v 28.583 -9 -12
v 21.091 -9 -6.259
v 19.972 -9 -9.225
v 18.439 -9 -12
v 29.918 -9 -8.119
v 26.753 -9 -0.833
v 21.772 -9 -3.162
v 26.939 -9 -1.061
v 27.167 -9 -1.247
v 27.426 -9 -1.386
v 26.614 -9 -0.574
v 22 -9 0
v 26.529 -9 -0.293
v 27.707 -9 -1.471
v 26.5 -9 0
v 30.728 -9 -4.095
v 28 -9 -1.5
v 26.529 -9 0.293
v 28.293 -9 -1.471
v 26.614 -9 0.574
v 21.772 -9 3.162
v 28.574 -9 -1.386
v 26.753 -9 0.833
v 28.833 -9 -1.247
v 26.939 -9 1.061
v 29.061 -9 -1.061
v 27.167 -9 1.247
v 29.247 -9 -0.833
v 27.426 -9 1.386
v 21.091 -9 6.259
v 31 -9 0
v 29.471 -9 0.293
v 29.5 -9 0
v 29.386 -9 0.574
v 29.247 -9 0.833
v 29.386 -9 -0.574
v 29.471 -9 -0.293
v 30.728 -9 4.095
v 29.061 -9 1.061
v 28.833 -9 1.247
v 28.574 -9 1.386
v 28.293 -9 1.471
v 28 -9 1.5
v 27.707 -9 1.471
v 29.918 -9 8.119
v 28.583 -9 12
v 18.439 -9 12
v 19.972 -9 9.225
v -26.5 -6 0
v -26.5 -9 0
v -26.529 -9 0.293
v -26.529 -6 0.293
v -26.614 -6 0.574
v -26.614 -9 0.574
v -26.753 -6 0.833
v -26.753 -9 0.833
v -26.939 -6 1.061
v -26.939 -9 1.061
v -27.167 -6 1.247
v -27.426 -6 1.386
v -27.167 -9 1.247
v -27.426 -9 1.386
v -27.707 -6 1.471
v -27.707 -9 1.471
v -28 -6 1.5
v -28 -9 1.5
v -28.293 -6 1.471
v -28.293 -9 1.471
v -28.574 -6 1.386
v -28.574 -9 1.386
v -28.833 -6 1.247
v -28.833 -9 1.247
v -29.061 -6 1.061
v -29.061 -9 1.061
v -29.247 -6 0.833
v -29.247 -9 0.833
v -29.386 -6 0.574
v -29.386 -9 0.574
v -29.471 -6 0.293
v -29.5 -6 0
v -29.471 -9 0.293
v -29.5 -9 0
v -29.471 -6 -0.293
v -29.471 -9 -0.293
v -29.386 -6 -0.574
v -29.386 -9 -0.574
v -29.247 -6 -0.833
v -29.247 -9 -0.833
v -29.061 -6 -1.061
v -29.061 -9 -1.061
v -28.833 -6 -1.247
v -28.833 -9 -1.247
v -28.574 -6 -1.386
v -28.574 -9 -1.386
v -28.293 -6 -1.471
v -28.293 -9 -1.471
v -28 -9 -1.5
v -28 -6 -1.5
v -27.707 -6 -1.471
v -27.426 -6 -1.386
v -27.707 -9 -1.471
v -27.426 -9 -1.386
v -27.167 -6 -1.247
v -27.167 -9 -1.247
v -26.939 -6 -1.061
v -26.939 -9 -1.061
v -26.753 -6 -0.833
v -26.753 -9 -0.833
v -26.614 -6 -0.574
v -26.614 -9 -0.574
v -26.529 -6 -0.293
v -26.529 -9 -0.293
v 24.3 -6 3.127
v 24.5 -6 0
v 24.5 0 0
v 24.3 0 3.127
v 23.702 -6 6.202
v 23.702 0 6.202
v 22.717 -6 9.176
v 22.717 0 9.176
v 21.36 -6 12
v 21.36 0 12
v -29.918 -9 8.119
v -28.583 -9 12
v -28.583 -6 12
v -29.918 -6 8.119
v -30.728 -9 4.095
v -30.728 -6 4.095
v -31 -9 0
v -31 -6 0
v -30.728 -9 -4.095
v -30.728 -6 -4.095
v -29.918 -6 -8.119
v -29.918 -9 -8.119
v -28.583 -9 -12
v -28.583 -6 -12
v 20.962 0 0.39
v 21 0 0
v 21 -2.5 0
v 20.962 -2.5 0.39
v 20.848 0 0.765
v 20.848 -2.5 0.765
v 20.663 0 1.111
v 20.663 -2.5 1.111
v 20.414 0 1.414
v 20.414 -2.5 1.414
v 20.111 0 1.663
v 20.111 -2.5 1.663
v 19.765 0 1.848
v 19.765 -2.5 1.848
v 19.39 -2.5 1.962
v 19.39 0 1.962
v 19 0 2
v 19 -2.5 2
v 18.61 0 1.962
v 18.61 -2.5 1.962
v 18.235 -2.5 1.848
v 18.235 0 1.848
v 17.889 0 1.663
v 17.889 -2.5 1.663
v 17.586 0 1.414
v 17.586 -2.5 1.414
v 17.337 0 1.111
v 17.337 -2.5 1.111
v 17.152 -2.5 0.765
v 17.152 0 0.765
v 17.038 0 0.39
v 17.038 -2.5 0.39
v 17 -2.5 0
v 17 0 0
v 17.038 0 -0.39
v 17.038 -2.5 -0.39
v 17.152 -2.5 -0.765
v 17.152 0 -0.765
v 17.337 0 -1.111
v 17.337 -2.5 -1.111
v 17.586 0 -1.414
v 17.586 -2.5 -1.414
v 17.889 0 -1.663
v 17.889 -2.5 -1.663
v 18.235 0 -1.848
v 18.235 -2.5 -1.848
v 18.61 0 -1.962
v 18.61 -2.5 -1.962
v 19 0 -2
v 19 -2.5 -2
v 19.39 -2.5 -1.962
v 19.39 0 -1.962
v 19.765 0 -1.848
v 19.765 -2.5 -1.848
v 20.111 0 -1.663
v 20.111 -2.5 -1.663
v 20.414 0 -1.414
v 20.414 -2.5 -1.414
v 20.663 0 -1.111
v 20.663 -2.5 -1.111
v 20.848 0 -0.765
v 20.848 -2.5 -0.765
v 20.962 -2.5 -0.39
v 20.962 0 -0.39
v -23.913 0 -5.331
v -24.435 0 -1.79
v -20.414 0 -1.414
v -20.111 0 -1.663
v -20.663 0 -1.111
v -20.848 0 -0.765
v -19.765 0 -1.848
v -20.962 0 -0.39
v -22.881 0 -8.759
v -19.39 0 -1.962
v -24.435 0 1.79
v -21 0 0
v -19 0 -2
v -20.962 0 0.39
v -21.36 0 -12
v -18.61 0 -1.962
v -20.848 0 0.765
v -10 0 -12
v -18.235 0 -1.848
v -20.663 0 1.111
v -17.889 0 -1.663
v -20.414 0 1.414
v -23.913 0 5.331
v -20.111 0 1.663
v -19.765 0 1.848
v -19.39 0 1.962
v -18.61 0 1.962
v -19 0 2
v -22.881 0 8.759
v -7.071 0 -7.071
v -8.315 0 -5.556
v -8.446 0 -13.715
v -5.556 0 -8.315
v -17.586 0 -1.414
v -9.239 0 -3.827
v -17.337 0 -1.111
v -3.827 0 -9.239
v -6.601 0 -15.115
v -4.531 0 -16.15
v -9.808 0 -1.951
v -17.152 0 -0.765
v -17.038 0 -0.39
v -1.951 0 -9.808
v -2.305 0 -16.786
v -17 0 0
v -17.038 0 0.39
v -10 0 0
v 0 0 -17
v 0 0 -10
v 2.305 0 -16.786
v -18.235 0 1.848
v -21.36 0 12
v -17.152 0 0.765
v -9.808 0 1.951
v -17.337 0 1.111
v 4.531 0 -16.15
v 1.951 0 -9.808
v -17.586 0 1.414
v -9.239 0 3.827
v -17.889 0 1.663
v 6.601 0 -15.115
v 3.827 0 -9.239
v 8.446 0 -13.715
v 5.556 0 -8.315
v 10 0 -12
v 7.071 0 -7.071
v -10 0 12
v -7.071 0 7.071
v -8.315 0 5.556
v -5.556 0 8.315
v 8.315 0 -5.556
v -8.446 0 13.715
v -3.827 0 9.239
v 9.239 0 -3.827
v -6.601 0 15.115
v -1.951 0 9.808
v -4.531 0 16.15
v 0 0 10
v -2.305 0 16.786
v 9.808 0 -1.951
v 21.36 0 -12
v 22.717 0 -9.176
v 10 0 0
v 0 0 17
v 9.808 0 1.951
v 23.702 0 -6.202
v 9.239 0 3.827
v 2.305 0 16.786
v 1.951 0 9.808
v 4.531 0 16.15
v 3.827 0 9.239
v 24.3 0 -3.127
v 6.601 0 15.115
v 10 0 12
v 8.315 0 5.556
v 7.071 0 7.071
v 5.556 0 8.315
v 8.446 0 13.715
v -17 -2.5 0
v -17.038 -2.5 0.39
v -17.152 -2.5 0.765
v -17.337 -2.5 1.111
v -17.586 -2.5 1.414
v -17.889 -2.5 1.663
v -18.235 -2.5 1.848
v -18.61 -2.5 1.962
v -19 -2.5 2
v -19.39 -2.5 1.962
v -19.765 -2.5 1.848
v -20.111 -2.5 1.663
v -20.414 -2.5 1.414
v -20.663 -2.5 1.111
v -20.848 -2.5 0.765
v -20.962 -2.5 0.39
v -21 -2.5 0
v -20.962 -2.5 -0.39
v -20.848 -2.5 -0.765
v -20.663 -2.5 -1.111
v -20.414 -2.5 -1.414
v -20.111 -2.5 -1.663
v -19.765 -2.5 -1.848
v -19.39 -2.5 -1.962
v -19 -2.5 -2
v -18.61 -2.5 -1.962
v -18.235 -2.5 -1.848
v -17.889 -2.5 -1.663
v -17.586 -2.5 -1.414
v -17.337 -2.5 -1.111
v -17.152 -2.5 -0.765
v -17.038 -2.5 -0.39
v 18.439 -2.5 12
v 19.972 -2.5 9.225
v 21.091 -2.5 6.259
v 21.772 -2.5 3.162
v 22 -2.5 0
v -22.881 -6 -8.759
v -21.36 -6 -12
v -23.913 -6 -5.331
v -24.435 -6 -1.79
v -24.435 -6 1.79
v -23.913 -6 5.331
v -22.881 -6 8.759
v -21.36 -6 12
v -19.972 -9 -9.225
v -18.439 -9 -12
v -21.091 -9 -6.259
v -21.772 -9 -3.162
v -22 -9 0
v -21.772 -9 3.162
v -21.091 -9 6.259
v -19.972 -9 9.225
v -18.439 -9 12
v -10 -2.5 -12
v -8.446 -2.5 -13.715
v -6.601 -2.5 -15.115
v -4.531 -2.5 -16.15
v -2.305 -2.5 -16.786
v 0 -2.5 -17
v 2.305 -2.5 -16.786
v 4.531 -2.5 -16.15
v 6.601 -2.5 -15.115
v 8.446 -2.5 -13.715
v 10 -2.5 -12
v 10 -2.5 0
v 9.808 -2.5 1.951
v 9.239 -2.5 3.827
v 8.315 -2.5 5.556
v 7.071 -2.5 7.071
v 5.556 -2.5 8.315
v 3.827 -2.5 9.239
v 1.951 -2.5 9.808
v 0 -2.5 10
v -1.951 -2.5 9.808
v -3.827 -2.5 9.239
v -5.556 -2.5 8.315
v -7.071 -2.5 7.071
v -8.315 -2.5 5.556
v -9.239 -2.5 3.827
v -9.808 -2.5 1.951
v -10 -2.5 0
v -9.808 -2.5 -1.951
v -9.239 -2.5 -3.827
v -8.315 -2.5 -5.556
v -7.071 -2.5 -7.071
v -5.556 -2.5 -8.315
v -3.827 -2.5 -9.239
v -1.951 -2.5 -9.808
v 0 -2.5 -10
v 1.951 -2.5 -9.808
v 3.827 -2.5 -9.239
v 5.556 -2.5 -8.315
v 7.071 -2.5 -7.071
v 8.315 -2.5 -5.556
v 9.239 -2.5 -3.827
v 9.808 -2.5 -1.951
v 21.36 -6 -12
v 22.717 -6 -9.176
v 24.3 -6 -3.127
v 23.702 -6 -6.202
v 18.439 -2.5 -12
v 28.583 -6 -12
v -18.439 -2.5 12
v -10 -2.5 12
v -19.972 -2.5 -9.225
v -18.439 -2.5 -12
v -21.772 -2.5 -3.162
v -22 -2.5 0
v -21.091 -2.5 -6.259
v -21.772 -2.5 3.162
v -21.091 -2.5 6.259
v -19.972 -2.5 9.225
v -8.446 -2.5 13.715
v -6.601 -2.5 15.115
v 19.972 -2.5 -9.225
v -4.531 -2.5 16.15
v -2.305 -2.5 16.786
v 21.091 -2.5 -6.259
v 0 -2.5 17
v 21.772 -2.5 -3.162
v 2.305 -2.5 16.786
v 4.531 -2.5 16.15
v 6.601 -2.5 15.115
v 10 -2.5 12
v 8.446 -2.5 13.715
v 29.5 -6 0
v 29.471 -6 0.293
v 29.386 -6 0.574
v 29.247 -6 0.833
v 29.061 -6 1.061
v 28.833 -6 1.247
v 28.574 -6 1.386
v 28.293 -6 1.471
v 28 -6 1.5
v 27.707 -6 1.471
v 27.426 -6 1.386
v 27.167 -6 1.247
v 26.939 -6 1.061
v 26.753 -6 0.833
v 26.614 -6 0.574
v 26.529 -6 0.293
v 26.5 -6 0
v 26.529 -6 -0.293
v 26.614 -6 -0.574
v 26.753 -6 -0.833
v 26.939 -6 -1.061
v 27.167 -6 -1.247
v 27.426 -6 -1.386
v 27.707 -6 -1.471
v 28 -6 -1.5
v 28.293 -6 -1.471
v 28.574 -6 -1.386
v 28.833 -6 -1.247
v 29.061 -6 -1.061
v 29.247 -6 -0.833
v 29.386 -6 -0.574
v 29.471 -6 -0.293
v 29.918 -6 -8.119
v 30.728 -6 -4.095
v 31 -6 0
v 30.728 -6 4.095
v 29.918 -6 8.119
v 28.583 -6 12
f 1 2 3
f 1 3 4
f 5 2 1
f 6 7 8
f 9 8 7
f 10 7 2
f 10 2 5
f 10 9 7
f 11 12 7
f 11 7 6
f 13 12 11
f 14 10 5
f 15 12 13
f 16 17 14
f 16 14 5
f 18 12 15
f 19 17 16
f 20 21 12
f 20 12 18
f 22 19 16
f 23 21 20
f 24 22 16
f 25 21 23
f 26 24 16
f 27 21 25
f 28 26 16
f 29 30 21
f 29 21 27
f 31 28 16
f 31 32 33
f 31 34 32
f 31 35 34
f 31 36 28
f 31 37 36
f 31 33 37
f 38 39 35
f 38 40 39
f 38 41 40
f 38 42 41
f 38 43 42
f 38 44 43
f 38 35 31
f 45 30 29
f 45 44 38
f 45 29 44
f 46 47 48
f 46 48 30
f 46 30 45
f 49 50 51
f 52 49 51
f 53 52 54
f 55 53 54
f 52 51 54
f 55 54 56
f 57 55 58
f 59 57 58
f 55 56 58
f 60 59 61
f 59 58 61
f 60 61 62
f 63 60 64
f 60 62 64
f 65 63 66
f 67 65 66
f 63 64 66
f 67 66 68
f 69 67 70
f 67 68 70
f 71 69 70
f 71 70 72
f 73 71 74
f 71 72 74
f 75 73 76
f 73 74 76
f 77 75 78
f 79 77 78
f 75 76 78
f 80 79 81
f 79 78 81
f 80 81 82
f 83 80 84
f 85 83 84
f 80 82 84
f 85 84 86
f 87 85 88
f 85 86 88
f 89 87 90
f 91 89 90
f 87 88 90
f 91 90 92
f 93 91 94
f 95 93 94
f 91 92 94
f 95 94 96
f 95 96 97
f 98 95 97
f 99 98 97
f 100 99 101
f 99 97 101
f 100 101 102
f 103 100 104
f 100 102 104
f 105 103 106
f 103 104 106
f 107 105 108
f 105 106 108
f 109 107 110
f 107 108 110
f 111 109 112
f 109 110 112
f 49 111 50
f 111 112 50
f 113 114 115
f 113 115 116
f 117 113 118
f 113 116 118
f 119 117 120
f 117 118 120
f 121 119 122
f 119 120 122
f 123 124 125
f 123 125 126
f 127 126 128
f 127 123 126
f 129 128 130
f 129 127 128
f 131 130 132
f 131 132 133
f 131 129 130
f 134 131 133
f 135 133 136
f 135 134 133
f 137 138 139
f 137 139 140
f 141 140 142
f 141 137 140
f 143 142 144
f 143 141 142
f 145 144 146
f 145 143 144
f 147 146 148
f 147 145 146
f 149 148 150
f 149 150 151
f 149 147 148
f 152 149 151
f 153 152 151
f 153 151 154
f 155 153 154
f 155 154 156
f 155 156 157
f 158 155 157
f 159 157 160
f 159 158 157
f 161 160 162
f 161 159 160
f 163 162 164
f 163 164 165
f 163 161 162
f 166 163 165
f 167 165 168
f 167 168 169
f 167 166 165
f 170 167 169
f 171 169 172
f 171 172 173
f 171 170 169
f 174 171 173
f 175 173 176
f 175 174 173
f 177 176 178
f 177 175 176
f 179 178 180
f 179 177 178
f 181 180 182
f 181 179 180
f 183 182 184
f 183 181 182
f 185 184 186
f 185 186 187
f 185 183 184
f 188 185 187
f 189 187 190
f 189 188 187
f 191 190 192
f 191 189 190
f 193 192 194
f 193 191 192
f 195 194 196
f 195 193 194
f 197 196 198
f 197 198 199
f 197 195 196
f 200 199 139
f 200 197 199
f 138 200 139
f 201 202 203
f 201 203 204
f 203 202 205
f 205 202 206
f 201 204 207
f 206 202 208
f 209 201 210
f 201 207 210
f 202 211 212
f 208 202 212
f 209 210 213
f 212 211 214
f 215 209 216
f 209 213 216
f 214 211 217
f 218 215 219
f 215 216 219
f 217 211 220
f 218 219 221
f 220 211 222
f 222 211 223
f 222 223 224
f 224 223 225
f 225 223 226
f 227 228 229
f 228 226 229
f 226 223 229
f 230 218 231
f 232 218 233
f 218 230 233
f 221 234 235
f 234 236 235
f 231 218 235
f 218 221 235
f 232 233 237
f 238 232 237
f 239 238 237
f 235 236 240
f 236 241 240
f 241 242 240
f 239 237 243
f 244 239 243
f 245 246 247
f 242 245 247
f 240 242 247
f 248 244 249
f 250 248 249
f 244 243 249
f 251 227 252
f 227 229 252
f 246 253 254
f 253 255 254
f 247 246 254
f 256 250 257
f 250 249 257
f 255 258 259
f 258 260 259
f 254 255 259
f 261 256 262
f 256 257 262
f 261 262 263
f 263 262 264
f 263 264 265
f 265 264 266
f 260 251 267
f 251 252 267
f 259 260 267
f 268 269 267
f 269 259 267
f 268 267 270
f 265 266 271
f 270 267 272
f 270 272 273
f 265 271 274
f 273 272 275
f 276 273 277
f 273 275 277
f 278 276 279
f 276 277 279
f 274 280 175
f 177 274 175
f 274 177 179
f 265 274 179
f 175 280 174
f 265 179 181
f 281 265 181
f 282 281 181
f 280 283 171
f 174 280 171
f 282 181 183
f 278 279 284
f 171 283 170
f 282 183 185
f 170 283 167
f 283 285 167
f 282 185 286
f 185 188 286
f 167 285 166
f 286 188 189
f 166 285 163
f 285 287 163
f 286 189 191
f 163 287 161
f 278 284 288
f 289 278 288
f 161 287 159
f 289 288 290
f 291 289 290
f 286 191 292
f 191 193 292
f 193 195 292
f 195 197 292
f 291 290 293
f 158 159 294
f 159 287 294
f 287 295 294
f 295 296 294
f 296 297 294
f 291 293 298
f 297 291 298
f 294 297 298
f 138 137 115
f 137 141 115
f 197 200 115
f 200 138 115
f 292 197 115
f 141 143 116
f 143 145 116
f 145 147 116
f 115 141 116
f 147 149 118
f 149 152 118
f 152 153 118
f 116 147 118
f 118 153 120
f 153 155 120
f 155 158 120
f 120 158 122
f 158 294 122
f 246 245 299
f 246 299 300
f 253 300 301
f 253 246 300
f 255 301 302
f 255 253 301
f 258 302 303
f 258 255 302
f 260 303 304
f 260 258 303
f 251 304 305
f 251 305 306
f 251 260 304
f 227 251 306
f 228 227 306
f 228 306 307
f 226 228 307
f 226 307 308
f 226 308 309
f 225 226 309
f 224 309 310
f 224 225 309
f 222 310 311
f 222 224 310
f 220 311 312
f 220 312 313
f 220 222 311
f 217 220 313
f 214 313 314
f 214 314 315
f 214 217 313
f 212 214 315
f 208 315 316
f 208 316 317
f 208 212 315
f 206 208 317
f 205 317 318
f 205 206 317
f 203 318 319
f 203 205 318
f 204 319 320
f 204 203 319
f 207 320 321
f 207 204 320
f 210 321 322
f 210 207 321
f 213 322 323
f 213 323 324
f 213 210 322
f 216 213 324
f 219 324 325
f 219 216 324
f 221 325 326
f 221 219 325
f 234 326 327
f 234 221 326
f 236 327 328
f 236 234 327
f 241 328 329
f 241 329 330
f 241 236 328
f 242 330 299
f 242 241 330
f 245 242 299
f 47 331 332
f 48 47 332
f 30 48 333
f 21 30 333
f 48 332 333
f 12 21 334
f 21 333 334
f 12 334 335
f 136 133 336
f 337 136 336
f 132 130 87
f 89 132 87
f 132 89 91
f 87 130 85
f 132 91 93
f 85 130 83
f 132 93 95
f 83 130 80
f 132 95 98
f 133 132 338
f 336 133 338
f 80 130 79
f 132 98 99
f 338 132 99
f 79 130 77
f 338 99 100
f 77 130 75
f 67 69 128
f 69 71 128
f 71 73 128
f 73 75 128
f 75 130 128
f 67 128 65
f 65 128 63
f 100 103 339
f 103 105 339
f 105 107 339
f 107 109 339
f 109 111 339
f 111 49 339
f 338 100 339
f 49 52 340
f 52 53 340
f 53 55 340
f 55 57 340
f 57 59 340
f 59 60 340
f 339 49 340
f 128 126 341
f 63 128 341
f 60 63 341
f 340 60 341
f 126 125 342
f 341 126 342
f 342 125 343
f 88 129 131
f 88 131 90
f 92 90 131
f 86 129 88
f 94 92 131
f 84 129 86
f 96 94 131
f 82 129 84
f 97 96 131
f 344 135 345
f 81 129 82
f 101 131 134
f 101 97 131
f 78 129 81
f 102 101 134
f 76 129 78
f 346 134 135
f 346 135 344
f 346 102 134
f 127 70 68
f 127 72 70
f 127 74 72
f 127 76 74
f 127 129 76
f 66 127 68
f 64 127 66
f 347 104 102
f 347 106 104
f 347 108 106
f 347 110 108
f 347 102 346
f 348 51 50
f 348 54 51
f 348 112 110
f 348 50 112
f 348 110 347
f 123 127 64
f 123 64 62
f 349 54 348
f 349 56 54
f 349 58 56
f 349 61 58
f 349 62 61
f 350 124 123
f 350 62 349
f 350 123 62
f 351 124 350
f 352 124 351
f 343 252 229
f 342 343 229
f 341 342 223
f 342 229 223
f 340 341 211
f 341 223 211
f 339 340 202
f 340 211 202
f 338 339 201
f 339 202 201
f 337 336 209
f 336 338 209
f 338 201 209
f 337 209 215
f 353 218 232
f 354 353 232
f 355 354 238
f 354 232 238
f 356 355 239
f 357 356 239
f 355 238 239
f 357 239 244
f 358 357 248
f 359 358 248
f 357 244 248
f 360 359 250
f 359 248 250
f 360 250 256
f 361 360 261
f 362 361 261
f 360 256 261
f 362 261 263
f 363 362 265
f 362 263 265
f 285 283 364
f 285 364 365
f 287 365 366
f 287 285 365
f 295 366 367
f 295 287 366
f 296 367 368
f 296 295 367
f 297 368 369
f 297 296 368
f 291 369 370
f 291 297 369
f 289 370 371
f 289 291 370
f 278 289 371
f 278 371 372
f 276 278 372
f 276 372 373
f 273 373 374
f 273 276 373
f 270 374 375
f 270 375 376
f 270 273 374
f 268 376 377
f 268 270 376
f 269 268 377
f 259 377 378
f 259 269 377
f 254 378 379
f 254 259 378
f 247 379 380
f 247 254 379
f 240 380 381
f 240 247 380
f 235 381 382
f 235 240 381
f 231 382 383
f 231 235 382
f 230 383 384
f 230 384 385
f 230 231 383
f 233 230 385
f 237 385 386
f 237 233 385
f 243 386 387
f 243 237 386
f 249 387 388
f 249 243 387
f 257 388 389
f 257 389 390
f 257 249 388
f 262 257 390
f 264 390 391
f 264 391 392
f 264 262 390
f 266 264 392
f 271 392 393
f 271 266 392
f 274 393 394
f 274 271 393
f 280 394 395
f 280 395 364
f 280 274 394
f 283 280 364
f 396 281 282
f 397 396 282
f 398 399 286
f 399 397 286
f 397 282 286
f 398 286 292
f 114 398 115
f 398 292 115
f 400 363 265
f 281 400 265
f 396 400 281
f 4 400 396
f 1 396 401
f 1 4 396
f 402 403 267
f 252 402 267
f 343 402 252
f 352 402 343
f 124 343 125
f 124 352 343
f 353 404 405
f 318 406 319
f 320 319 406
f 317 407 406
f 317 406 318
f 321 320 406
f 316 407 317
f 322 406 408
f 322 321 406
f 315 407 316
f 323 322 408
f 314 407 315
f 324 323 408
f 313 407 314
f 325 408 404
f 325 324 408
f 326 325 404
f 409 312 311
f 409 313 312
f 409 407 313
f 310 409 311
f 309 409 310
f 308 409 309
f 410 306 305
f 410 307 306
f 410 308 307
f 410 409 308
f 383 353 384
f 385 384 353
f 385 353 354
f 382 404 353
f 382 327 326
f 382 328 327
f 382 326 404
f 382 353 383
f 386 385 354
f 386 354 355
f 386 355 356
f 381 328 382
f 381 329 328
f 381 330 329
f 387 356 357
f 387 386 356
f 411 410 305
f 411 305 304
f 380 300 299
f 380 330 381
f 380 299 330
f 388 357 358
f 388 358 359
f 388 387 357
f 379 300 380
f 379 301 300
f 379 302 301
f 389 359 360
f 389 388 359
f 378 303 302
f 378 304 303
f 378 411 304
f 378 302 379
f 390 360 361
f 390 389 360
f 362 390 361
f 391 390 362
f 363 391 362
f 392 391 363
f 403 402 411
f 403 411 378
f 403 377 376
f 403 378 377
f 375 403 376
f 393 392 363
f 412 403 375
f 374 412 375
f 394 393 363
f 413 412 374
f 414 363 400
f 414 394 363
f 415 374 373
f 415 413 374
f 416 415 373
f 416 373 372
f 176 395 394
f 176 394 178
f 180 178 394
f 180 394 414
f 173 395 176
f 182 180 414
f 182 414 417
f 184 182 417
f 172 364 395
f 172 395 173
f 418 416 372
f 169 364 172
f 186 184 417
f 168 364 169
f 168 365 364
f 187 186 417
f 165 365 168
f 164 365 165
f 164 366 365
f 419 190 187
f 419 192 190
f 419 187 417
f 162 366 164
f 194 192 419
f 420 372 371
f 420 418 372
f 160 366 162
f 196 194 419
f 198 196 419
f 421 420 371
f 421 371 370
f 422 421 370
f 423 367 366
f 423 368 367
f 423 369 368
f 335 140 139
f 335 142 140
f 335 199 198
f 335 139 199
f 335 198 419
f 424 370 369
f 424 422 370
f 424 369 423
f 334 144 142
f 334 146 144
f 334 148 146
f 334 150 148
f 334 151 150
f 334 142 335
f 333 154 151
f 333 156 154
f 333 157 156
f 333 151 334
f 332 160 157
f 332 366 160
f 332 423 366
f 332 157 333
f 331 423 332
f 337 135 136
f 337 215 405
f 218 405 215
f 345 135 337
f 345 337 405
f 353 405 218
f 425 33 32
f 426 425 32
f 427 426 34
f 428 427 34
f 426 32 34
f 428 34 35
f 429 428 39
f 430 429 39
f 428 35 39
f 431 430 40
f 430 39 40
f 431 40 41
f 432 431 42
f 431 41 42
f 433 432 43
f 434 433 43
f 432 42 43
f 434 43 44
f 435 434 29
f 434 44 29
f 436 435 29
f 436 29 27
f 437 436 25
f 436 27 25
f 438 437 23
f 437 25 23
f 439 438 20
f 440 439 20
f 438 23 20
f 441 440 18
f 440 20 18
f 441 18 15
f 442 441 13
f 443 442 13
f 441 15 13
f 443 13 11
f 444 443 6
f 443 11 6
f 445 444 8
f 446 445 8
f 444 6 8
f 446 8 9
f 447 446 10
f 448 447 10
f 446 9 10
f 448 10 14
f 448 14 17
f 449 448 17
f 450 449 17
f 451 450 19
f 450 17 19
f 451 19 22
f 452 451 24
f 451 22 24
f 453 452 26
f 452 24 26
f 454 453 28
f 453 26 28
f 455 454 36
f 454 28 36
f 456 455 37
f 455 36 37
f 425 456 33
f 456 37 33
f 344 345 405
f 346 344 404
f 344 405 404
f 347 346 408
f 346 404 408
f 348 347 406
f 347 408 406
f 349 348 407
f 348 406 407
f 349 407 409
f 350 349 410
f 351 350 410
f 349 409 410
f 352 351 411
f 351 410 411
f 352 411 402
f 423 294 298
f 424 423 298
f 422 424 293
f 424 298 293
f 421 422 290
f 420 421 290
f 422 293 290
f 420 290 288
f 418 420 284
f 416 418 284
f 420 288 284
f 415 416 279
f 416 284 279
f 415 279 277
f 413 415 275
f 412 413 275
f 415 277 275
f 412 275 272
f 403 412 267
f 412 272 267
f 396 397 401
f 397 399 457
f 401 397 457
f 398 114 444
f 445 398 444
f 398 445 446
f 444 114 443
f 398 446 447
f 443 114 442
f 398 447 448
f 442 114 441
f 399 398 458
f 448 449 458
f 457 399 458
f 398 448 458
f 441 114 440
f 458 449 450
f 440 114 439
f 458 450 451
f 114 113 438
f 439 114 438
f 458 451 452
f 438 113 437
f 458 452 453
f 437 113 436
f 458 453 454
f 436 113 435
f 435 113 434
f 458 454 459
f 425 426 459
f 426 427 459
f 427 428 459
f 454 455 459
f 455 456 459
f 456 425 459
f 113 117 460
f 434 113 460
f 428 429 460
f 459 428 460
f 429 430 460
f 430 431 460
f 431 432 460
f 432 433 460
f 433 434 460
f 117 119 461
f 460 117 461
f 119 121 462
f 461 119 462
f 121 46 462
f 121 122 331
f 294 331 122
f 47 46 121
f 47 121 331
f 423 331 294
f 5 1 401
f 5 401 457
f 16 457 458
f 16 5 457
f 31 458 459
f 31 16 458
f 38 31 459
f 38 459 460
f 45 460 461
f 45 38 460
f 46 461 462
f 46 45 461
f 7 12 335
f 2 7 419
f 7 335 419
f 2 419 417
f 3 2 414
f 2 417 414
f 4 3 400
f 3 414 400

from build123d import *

# Parameters (mm, degrees)
F0_R     = 2
F0_R_2   = 10
F1_DEPTH = 2.5
F2_DEPTH = 9
F3_R     = 1.5
F4_DEPTH = 3
F5_DEPTH = 2.5


with BuildPart() as f1:
    # F0 (on Front) → F1 (new body)
    with BuildSketch(Plane.XZ):
        with BuildLine():
            ThreePointArc((22, 0), (21.090993, 6.258596), (18.439089, 12))
            Line((18.439089, 12), (10, 12))
            Line((10, 12), (-10, 12))
            Line((-10, 12), (-18.439089, 12))
            ThreePointArc((-18.439089, 12), (-22, 0), (-18.439089, -12))
            Line((-18.439089, -12), (-10, -12))
            Line((-10, -12), (10, -12))
            Line((10, -12), (18.439089, -12))
            ThreePointArc((18.439089, -12), (21.090993, -6.258596), (22, 0))
        make_face()
        with Locations((-19, 0)):
            Circle(F0_R, mode=Mode.SUBTRACT)
        Circle(F0_R_2, mode=Mode.SUBTRACT)
        with Locations((19, 0)):
            Circle(F0_R, mode=Mode.SUBTRACT)
    extrude(amount=F1_DEPTH)

    # F0 (on Front) → F2 (join)
    with BuildSketch(Plane.XZ):
        with BuildLine():
            ThreePointArc((24.5, 0), (23.702007, 6.202007), (21.360009, 12))
            Line((21.360009, 12), (18.439089, 12))
            ThreePointArc((18.439089, 12), (21.090993, 6.258596), (22, 0))
            ThreePointArc((22, 0), (21.090993, -6.258596), (18.439089, -12))
            Line((18.439089, -12), (21.360009, -12))
            ThreePointArc((21.360009, -12), (23.702007, -6.202007), (24.5, 0))
        make_face()
        with BuildLine():
            Line((-18.439089, 12), (-21.360009, 12))
            ThreePointArc((-21.360009, 12), (-24.5, 0), (-21.360009, -12))
            Line((-21.360009, -12), (-18.439089, -12))
            ThreePointArc((-18.439089, -12), (-22, 0), (-18.439089, 12))
        make_face()
    extrude(amount=F2_DEPTH)

    # F3 (on face) → F4 (join)
    with BuildSketch(Plane.XZ.offset(9)):
        with BuildLine():
            Line((-21.360009, 12), (-28.583212, 12))
            ThreePointArc((-28.583212, 12), (-31, 0), (-28.583212, -12))
            Line((-28.583212, -12), (-21.360009, -12))
            ThreePointArc((-21.360009, -12), (-24.5, 0), (-21.360009, 12))
        make_face()
        with Locations((-28, 0)):
            Circle(F3_R, mode=Mode.SUBTRACT)
        with BuildLine():
            ThreePointArc((28.583212, -12), (30.389797, -6.120475), (31, 0))
            ThreePointArc((31, 0), (30.389797, 6.120475), (28.583212, 12))
            Line((28.583212, 12), (21.360009, 12))
            ThreePointArc((21.360009, 12), (23.702007, 6.202007), (24.5, 0))
            ThreePointArc((24.5, 0), (23.702007, -6.202007), (21.360009, -12))
            Line((21.360009, -12), (28.583212, -12))
        make_face()
        with Locations((28, 0)):
            Circle(F3_R, mode=Mode.SUBTRACT)
    extrude(amount=-F4_DEPTH)

    # F0 (on Front) → F5 (join)
    with BuildSketch(Plane.XZ):
        with BuildLine():
            Line((-10, 12), (10, 12))
            ThreePointArc((10, 12), (0, 17), (-10, 12))
        make_face()
        with BuildLine():
            ThreePointArc((-10, -12), (0, -17), (10, -12))
            Line((10, -12), (-10, -12))
        make_face()
    extrude(amount=F5_DEPTH)


solid = f1.part
